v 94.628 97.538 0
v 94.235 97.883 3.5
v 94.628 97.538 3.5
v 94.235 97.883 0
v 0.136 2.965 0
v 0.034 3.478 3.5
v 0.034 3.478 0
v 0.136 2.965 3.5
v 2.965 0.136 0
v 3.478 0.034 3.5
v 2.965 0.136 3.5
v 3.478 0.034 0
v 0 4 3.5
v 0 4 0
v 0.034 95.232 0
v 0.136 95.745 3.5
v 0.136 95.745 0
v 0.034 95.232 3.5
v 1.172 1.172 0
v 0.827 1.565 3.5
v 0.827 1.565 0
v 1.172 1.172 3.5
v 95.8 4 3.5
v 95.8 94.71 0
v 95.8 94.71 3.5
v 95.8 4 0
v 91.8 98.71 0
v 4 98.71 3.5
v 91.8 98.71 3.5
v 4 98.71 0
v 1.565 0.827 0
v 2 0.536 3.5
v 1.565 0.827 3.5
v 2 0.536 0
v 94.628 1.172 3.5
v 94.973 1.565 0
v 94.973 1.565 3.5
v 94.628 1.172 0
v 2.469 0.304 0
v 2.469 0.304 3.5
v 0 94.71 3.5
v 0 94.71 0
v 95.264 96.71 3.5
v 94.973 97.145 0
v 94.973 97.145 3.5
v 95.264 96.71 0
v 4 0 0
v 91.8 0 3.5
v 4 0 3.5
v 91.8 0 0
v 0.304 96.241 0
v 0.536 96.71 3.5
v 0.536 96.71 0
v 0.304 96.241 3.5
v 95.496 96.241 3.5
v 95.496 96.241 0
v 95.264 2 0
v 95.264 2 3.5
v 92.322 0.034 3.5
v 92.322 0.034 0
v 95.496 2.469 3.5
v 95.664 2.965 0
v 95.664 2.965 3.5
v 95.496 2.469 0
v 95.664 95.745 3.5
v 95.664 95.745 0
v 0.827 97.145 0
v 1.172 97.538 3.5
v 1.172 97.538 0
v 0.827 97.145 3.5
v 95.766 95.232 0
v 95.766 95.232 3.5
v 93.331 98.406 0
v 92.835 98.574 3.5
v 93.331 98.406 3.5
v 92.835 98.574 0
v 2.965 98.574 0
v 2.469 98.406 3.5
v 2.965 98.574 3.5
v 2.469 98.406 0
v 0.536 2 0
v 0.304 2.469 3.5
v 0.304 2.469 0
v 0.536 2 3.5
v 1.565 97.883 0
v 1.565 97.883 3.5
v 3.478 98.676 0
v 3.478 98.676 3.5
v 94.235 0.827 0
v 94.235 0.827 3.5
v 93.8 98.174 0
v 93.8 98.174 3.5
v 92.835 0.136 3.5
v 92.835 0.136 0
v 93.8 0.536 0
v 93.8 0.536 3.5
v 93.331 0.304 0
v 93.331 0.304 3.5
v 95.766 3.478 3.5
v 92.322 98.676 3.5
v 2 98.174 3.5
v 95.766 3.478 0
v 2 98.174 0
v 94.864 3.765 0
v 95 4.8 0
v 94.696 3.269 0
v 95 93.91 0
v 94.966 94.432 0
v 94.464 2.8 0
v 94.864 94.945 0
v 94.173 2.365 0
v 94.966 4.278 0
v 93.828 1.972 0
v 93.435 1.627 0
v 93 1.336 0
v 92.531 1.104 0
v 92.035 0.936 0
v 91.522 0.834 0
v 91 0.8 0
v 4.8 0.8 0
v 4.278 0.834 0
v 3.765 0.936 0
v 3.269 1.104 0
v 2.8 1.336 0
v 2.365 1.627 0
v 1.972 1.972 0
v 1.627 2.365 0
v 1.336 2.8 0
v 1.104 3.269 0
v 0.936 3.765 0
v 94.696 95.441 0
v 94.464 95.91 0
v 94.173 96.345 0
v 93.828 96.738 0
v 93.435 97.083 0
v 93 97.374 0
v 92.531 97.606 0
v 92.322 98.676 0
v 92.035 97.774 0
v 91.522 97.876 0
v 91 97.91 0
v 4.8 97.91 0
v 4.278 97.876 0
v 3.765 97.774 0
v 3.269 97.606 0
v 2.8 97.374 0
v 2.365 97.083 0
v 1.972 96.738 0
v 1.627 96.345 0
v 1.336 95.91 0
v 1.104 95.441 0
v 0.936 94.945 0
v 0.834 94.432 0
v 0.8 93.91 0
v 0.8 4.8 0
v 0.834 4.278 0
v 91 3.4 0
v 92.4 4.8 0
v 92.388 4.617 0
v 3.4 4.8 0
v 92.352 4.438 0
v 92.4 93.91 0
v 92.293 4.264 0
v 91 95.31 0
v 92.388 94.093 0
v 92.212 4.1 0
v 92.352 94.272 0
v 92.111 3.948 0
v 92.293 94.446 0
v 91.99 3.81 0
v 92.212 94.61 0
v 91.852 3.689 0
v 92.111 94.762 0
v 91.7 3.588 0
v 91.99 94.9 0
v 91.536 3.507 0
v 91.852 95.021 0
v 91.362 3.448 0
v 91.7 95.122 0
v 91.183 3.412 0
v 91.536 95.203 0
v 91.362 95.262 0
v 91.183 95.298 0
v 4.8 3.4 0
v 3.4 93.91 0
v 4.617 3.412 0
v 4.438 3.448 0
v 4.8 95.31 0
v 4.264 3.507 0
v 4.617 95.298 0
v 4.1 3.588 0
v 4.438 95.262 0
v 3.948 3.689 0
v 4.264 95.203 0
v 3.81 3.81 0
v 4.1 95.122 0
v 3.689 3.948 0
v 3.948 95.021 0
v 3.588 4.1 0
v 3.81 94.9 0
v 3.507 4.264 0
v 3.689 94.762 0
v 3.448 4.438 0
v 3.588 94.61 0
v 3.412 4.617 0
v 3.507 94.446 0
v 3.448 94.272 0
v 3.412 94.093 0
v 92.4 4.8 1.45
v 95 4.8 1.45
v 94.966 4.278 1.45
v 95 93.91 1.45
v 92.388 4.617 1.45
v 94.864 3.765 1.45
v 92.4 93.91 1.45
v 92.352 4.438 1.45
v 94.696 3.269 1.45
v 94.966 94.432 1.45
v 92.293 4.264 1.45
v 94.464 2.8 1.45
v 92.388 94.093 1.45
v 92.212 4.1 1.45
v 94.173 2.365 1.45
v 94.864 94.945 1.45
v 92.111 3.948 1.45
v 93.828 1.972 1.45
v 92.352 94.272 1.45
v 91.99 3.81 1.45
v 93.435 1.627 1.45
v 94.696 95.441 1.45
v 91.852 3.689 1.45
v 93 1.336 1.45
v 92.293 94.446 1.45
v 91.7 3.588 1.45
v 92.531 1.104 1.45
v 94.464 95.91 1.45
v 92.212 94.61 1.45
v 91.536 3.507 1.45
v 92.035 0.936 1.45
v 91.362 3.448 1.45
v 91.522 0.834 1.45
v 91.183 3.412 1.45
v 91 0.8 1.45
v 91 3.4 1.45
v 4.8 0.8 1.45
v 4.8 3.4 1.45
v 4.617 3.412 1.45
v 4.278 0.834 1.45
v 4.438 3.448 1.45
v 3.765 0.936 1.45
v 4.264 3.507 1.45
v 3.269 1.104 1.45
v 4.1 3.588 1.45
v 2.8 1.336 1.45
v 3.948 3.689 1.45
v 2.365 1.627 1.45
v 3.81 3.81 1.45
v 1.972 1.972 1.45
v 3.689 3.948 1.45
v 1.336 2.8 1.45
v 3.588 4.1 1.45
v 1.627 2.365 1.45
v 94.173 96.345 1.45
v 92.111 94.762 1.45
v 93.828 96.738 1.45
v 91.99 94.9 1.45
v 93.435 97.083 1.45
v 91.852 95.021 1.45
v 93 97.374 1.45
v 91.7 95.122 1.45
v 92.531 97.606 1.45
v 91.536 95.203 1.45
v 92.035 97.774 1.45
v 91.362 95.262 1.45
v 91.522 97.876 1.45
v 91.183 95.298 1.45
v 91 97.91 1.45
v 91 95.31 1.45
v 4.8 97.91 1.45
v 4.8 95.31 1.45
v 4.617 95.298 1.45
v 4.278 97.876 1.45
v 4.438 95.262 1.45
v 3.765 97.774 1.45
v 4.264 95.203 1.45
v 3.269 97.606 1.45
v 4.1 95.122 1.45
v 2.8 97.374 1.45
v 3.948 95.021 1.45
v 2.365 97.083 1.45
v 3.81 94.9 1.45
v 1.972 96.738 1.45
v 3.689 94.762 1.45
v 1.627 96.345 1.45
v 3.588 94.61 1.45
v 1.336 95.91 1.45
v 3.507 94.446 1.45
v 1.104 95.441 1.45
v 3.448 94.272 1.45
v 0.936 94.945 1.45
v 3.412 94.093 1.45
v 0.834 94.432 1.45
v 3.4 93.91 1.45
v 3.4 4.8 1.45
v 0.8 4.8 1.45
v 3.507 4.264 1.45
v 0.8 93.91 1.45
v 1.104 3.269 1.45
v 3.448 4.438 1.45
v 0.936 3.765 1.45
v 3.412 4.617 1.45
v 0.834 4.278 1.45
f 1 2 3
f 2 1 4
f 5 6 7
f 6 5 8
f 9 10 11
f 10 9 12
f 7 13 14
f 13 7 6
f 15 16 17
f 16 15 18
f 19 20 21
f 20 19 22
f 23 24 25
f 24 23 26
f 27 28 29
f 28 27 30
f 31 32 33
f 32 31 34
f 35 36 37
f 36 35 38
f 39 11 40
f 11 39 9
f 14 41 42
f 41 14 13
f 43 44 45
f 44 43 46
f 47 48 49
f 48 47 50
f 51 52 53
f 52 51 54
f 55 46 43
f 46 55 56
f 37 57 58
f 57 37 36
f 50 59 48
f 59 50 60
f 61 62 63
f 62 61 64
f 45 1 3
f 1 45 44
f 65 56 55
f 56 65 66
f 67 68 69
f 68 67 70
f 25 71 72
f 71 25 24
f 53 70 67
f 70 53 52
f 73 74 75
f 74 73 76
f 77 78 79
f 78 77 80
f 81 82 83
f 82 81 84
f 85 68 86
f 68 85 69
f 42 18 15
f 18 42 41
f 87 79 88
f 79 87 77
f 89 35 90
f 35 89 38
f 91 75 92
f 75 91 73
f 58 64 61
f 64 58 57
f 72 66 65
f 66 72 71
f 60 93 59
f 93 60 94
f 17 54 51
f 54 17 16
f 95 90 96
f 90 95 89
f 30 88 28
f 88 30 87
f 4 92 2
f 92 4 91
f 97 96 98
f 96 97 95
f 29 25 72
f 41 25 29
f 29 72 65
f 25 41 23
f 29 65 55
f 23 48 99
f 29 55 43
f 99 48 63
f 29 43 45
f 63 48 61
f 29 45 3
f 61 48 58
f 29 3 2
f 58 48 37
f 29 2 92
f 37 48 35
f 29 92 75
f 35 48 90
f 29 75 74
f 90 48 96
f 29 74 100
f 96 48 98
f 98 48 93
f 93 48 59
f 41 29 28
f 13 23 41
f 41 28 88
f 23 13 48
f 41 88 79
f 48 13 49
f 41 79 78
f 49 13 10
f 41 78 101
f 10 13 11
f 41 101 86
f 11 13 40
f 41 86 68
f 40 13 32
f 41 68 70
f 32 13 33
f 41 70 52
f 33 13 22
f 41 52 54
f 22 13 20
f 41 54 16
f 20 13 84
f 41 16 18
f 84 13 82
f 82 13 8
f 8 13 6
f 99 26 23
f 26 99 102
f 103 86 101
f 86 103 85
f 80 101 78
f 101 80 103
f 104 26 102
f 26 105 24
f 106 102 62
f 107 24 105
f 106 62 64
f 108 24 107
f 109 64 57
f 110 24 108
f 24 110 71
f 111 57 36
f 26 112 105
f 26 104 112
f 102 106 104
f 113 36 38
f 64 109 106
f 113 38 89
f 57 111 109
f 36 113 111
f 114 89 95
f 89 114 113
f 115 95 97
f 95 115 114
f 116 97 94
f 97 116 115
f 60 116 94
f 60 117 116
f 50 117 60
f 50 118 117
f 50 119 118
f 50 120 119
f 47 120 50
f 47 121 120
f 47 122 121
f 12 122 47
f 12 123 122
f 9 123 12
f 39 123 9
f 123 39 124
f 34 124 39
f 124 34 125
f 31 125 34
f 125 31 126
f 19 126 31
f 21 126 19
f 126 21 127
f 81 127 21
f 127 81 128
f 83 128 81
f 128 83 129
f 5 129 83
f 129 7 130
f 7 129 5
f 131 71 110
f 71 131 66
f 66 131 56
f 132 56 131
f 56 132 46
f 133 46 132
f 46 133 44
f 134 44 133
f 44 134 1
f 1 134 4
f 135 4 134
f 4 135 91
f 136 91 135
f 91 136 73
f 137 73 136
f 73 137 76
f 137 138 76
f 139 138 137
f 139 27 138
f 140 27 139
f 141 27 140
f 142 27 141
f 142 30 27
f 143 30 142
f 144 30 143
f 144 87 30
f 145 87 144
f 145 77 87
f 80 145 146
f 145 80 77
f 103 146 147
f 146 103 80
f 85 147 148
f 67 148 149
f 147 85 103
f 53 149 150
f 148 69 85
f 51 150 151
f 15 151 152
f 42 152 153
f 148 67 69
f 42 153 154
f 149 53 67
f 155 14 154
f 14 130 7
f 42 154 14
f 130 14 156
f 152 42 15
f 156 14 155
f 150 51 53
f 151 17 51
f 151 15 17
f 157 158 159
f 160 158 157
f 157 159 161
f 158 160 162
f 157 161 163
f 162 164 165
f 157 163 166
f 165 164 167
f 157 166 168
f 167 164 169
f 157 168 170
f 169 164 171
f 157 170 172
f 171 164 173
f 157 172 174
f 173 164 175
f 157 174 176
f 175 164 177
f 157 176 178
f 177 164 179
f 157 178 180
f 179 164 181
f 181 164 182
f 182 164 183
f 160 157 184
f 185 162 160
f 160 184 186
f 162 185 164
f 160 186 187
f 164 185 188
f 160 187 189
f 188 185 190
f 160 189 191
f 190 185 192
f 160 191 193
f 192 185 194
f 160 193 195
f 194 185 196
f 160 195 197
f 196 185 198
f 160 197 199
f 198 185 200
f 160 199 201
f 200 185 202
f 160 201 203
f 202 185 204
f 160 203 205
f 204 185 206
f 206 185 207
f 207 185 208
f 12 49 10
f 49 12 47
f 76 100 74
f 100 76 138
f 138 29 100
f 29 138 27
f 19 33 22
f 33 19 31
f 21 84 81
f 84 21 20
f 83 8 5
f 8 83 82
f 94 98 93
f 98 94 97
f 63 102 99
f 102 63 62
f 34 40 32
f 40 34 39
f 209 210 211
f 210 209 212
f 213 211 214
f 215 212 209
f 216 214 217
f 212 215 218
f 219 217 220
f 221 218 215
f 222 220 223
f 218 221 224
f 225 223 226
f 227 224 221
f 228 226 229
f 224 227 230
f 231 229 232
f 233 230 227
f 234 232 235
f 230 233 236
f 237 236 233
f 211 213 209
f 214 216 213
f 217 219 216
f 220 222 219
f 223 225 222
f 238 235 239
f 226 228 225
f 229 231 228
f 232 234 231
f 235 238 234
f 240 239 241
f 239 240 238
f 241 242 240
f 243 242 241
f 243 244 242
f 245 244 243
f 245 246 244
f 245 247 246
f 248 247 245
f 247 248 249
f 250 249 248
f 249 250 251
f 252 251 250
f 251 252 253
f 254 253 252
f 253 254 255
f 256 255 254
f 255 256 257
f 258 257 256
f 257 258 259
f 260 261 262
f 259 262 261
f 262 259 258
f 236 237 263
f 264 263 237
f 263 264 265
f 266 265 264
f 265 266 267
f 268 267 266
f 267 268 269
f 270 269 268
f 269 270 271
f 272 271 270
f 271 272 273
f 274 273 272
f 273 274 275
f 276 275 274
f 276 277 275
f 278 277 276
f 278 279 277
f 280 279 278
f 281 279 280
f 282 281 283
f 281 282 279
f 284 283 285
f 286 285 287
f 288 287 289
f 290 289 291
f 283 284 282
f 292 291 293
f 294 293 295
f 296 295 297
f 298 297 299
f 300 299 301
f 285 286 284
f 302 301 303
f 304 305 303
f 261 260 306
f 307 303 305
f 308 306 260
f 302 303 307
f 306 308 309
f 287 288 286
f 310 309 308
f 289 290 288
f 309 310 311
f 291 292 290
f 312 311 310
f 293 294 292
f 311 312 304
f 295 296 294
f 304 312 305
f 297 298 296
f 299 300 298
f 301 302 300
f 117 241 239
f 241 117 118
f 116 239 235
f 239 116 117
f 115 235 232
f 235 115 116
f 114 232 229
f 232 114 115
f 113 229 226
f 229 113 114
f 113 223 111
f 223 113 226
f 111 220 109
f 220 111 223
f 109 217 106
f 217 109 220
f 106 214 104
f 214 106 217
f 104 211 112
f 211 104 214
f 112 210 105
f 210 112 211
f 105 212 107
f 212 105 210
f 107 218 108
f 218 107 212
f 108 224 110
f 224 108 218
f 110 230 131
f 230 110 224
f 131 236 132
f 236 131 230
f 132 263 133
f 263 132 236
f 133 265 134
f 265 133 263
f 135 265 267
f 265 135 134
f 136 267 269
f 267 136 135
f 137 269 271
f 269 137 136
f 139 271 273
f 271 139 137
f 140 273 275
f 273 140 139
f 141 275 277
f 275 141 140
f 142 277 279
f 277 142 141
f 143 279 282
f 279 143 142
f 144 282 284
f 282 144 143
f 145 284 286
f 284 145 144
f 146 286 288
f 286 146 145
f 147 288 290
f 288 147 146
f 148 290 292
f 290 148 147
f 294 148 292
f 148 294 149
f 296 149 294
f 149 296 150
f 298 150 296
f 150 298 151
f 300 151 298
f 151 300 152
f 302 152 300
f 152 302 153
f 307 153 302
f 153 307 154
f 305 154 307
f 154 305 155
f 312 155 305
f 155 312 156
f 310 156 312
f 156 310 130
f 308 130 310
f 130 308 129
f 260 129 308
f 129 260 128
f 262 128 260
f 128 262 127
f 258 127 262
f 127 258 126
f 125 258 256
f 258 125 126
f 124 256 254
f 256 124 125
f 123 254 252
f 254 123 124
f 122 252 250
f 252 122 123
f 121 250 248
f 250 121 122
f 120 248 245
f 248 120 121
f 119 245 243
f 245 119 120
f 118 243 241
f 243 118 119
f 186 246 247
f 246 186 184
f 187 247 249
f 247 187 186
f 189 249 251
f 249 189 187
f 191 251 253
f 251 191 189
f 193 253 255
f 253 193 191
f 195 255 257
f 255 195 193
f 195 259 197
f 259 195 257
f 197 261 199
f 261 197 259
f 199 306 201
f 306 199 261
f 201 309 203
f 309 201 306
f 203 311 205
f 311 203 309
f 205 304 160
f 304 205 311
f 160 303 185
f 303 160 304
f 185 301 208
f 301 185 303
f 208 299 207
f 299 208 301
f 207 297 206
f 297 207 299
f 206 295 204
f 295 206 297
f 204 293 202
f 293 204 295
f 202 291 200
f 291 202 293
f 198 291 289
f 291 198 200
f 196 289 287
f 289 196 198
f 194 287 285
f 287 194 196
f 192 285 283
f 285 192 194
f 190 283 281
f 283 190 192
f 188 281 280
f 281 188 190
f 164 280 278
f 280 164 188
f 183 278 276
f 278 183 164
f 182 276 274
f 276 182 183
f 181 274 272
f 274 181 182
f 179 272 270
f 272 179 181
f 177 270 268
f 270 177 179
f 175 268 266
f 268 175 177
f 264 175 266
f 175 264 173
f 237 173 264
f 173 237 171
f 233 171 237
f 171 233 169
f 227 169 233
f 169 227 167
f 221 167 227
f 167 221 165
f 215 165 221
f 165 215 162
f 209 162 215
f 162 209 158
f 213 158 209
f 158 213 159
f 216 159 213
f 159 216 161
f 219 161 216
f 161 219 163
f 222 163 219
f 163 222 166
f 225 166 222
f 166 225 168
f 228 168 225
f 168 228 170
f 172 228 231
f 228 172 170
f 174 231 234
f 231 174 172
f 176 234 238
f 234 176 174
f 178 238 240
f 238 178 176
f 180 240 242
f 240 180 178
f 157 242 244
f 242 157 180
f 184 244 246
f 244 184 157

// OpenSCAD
// First-pass printed lid O-ring groove pattern.

$fn = 48;

body_width = 95.8;
body_length = 98.71;
lid_top_thickness = 3.5;
lid_corner_radius = 4;

oring_cross_section_diameter = 2.0;
oring_groove_width = 2.6;
oring_groove_depth = 1.4;
oring_groove_outer_inset = 0.8;

module rounded_box_2d(w, d, r) {
    rr = max(0.01, min(r, min(w, d) / 2 - 0.01));
    hull() {
        for (x = [rr, w - rr])
            for (y = [rr, d - rr])
                translate([x, y])
                    circle(r = rr);
    }
}

module rounded_ring_2d(outer_w, outer_d, ring_w, outer_r, inner_r) {
    difference() {
        rounded_box_2d(outer_w, outer_d, outer_r);
        translate([ring_w, ring_w])
            rounded_box_2d(
                outer_w - 2 * ring_w,
                outer_d - 2 * ring_w,
                inner_r
            );
    }
}

module lid_panel() {
    linear_extrude(height = lid_top_thickness)
        rounded_box_2d(body_width, body_length, lid_corner_radius);
}

module oring_groove_cut() {
    translate([oring_groove_outer_inset, oring_groove_outer_inset, -0.05])
        linear_extrude(height = oring_groove_depth + 0.10)
            rounded_ring_2d(
                body_width - 2 * oring_groove_outer_inset,
                body_length - 2 * oring_groove_outer_inset,
                oring_groove_width,
                lid_corner_radius,
                max(0.6, lid_corner_radius - oring_groove_width)
            );
}

difference() {
    lid_panel();
    oring_groove_cut();
}
